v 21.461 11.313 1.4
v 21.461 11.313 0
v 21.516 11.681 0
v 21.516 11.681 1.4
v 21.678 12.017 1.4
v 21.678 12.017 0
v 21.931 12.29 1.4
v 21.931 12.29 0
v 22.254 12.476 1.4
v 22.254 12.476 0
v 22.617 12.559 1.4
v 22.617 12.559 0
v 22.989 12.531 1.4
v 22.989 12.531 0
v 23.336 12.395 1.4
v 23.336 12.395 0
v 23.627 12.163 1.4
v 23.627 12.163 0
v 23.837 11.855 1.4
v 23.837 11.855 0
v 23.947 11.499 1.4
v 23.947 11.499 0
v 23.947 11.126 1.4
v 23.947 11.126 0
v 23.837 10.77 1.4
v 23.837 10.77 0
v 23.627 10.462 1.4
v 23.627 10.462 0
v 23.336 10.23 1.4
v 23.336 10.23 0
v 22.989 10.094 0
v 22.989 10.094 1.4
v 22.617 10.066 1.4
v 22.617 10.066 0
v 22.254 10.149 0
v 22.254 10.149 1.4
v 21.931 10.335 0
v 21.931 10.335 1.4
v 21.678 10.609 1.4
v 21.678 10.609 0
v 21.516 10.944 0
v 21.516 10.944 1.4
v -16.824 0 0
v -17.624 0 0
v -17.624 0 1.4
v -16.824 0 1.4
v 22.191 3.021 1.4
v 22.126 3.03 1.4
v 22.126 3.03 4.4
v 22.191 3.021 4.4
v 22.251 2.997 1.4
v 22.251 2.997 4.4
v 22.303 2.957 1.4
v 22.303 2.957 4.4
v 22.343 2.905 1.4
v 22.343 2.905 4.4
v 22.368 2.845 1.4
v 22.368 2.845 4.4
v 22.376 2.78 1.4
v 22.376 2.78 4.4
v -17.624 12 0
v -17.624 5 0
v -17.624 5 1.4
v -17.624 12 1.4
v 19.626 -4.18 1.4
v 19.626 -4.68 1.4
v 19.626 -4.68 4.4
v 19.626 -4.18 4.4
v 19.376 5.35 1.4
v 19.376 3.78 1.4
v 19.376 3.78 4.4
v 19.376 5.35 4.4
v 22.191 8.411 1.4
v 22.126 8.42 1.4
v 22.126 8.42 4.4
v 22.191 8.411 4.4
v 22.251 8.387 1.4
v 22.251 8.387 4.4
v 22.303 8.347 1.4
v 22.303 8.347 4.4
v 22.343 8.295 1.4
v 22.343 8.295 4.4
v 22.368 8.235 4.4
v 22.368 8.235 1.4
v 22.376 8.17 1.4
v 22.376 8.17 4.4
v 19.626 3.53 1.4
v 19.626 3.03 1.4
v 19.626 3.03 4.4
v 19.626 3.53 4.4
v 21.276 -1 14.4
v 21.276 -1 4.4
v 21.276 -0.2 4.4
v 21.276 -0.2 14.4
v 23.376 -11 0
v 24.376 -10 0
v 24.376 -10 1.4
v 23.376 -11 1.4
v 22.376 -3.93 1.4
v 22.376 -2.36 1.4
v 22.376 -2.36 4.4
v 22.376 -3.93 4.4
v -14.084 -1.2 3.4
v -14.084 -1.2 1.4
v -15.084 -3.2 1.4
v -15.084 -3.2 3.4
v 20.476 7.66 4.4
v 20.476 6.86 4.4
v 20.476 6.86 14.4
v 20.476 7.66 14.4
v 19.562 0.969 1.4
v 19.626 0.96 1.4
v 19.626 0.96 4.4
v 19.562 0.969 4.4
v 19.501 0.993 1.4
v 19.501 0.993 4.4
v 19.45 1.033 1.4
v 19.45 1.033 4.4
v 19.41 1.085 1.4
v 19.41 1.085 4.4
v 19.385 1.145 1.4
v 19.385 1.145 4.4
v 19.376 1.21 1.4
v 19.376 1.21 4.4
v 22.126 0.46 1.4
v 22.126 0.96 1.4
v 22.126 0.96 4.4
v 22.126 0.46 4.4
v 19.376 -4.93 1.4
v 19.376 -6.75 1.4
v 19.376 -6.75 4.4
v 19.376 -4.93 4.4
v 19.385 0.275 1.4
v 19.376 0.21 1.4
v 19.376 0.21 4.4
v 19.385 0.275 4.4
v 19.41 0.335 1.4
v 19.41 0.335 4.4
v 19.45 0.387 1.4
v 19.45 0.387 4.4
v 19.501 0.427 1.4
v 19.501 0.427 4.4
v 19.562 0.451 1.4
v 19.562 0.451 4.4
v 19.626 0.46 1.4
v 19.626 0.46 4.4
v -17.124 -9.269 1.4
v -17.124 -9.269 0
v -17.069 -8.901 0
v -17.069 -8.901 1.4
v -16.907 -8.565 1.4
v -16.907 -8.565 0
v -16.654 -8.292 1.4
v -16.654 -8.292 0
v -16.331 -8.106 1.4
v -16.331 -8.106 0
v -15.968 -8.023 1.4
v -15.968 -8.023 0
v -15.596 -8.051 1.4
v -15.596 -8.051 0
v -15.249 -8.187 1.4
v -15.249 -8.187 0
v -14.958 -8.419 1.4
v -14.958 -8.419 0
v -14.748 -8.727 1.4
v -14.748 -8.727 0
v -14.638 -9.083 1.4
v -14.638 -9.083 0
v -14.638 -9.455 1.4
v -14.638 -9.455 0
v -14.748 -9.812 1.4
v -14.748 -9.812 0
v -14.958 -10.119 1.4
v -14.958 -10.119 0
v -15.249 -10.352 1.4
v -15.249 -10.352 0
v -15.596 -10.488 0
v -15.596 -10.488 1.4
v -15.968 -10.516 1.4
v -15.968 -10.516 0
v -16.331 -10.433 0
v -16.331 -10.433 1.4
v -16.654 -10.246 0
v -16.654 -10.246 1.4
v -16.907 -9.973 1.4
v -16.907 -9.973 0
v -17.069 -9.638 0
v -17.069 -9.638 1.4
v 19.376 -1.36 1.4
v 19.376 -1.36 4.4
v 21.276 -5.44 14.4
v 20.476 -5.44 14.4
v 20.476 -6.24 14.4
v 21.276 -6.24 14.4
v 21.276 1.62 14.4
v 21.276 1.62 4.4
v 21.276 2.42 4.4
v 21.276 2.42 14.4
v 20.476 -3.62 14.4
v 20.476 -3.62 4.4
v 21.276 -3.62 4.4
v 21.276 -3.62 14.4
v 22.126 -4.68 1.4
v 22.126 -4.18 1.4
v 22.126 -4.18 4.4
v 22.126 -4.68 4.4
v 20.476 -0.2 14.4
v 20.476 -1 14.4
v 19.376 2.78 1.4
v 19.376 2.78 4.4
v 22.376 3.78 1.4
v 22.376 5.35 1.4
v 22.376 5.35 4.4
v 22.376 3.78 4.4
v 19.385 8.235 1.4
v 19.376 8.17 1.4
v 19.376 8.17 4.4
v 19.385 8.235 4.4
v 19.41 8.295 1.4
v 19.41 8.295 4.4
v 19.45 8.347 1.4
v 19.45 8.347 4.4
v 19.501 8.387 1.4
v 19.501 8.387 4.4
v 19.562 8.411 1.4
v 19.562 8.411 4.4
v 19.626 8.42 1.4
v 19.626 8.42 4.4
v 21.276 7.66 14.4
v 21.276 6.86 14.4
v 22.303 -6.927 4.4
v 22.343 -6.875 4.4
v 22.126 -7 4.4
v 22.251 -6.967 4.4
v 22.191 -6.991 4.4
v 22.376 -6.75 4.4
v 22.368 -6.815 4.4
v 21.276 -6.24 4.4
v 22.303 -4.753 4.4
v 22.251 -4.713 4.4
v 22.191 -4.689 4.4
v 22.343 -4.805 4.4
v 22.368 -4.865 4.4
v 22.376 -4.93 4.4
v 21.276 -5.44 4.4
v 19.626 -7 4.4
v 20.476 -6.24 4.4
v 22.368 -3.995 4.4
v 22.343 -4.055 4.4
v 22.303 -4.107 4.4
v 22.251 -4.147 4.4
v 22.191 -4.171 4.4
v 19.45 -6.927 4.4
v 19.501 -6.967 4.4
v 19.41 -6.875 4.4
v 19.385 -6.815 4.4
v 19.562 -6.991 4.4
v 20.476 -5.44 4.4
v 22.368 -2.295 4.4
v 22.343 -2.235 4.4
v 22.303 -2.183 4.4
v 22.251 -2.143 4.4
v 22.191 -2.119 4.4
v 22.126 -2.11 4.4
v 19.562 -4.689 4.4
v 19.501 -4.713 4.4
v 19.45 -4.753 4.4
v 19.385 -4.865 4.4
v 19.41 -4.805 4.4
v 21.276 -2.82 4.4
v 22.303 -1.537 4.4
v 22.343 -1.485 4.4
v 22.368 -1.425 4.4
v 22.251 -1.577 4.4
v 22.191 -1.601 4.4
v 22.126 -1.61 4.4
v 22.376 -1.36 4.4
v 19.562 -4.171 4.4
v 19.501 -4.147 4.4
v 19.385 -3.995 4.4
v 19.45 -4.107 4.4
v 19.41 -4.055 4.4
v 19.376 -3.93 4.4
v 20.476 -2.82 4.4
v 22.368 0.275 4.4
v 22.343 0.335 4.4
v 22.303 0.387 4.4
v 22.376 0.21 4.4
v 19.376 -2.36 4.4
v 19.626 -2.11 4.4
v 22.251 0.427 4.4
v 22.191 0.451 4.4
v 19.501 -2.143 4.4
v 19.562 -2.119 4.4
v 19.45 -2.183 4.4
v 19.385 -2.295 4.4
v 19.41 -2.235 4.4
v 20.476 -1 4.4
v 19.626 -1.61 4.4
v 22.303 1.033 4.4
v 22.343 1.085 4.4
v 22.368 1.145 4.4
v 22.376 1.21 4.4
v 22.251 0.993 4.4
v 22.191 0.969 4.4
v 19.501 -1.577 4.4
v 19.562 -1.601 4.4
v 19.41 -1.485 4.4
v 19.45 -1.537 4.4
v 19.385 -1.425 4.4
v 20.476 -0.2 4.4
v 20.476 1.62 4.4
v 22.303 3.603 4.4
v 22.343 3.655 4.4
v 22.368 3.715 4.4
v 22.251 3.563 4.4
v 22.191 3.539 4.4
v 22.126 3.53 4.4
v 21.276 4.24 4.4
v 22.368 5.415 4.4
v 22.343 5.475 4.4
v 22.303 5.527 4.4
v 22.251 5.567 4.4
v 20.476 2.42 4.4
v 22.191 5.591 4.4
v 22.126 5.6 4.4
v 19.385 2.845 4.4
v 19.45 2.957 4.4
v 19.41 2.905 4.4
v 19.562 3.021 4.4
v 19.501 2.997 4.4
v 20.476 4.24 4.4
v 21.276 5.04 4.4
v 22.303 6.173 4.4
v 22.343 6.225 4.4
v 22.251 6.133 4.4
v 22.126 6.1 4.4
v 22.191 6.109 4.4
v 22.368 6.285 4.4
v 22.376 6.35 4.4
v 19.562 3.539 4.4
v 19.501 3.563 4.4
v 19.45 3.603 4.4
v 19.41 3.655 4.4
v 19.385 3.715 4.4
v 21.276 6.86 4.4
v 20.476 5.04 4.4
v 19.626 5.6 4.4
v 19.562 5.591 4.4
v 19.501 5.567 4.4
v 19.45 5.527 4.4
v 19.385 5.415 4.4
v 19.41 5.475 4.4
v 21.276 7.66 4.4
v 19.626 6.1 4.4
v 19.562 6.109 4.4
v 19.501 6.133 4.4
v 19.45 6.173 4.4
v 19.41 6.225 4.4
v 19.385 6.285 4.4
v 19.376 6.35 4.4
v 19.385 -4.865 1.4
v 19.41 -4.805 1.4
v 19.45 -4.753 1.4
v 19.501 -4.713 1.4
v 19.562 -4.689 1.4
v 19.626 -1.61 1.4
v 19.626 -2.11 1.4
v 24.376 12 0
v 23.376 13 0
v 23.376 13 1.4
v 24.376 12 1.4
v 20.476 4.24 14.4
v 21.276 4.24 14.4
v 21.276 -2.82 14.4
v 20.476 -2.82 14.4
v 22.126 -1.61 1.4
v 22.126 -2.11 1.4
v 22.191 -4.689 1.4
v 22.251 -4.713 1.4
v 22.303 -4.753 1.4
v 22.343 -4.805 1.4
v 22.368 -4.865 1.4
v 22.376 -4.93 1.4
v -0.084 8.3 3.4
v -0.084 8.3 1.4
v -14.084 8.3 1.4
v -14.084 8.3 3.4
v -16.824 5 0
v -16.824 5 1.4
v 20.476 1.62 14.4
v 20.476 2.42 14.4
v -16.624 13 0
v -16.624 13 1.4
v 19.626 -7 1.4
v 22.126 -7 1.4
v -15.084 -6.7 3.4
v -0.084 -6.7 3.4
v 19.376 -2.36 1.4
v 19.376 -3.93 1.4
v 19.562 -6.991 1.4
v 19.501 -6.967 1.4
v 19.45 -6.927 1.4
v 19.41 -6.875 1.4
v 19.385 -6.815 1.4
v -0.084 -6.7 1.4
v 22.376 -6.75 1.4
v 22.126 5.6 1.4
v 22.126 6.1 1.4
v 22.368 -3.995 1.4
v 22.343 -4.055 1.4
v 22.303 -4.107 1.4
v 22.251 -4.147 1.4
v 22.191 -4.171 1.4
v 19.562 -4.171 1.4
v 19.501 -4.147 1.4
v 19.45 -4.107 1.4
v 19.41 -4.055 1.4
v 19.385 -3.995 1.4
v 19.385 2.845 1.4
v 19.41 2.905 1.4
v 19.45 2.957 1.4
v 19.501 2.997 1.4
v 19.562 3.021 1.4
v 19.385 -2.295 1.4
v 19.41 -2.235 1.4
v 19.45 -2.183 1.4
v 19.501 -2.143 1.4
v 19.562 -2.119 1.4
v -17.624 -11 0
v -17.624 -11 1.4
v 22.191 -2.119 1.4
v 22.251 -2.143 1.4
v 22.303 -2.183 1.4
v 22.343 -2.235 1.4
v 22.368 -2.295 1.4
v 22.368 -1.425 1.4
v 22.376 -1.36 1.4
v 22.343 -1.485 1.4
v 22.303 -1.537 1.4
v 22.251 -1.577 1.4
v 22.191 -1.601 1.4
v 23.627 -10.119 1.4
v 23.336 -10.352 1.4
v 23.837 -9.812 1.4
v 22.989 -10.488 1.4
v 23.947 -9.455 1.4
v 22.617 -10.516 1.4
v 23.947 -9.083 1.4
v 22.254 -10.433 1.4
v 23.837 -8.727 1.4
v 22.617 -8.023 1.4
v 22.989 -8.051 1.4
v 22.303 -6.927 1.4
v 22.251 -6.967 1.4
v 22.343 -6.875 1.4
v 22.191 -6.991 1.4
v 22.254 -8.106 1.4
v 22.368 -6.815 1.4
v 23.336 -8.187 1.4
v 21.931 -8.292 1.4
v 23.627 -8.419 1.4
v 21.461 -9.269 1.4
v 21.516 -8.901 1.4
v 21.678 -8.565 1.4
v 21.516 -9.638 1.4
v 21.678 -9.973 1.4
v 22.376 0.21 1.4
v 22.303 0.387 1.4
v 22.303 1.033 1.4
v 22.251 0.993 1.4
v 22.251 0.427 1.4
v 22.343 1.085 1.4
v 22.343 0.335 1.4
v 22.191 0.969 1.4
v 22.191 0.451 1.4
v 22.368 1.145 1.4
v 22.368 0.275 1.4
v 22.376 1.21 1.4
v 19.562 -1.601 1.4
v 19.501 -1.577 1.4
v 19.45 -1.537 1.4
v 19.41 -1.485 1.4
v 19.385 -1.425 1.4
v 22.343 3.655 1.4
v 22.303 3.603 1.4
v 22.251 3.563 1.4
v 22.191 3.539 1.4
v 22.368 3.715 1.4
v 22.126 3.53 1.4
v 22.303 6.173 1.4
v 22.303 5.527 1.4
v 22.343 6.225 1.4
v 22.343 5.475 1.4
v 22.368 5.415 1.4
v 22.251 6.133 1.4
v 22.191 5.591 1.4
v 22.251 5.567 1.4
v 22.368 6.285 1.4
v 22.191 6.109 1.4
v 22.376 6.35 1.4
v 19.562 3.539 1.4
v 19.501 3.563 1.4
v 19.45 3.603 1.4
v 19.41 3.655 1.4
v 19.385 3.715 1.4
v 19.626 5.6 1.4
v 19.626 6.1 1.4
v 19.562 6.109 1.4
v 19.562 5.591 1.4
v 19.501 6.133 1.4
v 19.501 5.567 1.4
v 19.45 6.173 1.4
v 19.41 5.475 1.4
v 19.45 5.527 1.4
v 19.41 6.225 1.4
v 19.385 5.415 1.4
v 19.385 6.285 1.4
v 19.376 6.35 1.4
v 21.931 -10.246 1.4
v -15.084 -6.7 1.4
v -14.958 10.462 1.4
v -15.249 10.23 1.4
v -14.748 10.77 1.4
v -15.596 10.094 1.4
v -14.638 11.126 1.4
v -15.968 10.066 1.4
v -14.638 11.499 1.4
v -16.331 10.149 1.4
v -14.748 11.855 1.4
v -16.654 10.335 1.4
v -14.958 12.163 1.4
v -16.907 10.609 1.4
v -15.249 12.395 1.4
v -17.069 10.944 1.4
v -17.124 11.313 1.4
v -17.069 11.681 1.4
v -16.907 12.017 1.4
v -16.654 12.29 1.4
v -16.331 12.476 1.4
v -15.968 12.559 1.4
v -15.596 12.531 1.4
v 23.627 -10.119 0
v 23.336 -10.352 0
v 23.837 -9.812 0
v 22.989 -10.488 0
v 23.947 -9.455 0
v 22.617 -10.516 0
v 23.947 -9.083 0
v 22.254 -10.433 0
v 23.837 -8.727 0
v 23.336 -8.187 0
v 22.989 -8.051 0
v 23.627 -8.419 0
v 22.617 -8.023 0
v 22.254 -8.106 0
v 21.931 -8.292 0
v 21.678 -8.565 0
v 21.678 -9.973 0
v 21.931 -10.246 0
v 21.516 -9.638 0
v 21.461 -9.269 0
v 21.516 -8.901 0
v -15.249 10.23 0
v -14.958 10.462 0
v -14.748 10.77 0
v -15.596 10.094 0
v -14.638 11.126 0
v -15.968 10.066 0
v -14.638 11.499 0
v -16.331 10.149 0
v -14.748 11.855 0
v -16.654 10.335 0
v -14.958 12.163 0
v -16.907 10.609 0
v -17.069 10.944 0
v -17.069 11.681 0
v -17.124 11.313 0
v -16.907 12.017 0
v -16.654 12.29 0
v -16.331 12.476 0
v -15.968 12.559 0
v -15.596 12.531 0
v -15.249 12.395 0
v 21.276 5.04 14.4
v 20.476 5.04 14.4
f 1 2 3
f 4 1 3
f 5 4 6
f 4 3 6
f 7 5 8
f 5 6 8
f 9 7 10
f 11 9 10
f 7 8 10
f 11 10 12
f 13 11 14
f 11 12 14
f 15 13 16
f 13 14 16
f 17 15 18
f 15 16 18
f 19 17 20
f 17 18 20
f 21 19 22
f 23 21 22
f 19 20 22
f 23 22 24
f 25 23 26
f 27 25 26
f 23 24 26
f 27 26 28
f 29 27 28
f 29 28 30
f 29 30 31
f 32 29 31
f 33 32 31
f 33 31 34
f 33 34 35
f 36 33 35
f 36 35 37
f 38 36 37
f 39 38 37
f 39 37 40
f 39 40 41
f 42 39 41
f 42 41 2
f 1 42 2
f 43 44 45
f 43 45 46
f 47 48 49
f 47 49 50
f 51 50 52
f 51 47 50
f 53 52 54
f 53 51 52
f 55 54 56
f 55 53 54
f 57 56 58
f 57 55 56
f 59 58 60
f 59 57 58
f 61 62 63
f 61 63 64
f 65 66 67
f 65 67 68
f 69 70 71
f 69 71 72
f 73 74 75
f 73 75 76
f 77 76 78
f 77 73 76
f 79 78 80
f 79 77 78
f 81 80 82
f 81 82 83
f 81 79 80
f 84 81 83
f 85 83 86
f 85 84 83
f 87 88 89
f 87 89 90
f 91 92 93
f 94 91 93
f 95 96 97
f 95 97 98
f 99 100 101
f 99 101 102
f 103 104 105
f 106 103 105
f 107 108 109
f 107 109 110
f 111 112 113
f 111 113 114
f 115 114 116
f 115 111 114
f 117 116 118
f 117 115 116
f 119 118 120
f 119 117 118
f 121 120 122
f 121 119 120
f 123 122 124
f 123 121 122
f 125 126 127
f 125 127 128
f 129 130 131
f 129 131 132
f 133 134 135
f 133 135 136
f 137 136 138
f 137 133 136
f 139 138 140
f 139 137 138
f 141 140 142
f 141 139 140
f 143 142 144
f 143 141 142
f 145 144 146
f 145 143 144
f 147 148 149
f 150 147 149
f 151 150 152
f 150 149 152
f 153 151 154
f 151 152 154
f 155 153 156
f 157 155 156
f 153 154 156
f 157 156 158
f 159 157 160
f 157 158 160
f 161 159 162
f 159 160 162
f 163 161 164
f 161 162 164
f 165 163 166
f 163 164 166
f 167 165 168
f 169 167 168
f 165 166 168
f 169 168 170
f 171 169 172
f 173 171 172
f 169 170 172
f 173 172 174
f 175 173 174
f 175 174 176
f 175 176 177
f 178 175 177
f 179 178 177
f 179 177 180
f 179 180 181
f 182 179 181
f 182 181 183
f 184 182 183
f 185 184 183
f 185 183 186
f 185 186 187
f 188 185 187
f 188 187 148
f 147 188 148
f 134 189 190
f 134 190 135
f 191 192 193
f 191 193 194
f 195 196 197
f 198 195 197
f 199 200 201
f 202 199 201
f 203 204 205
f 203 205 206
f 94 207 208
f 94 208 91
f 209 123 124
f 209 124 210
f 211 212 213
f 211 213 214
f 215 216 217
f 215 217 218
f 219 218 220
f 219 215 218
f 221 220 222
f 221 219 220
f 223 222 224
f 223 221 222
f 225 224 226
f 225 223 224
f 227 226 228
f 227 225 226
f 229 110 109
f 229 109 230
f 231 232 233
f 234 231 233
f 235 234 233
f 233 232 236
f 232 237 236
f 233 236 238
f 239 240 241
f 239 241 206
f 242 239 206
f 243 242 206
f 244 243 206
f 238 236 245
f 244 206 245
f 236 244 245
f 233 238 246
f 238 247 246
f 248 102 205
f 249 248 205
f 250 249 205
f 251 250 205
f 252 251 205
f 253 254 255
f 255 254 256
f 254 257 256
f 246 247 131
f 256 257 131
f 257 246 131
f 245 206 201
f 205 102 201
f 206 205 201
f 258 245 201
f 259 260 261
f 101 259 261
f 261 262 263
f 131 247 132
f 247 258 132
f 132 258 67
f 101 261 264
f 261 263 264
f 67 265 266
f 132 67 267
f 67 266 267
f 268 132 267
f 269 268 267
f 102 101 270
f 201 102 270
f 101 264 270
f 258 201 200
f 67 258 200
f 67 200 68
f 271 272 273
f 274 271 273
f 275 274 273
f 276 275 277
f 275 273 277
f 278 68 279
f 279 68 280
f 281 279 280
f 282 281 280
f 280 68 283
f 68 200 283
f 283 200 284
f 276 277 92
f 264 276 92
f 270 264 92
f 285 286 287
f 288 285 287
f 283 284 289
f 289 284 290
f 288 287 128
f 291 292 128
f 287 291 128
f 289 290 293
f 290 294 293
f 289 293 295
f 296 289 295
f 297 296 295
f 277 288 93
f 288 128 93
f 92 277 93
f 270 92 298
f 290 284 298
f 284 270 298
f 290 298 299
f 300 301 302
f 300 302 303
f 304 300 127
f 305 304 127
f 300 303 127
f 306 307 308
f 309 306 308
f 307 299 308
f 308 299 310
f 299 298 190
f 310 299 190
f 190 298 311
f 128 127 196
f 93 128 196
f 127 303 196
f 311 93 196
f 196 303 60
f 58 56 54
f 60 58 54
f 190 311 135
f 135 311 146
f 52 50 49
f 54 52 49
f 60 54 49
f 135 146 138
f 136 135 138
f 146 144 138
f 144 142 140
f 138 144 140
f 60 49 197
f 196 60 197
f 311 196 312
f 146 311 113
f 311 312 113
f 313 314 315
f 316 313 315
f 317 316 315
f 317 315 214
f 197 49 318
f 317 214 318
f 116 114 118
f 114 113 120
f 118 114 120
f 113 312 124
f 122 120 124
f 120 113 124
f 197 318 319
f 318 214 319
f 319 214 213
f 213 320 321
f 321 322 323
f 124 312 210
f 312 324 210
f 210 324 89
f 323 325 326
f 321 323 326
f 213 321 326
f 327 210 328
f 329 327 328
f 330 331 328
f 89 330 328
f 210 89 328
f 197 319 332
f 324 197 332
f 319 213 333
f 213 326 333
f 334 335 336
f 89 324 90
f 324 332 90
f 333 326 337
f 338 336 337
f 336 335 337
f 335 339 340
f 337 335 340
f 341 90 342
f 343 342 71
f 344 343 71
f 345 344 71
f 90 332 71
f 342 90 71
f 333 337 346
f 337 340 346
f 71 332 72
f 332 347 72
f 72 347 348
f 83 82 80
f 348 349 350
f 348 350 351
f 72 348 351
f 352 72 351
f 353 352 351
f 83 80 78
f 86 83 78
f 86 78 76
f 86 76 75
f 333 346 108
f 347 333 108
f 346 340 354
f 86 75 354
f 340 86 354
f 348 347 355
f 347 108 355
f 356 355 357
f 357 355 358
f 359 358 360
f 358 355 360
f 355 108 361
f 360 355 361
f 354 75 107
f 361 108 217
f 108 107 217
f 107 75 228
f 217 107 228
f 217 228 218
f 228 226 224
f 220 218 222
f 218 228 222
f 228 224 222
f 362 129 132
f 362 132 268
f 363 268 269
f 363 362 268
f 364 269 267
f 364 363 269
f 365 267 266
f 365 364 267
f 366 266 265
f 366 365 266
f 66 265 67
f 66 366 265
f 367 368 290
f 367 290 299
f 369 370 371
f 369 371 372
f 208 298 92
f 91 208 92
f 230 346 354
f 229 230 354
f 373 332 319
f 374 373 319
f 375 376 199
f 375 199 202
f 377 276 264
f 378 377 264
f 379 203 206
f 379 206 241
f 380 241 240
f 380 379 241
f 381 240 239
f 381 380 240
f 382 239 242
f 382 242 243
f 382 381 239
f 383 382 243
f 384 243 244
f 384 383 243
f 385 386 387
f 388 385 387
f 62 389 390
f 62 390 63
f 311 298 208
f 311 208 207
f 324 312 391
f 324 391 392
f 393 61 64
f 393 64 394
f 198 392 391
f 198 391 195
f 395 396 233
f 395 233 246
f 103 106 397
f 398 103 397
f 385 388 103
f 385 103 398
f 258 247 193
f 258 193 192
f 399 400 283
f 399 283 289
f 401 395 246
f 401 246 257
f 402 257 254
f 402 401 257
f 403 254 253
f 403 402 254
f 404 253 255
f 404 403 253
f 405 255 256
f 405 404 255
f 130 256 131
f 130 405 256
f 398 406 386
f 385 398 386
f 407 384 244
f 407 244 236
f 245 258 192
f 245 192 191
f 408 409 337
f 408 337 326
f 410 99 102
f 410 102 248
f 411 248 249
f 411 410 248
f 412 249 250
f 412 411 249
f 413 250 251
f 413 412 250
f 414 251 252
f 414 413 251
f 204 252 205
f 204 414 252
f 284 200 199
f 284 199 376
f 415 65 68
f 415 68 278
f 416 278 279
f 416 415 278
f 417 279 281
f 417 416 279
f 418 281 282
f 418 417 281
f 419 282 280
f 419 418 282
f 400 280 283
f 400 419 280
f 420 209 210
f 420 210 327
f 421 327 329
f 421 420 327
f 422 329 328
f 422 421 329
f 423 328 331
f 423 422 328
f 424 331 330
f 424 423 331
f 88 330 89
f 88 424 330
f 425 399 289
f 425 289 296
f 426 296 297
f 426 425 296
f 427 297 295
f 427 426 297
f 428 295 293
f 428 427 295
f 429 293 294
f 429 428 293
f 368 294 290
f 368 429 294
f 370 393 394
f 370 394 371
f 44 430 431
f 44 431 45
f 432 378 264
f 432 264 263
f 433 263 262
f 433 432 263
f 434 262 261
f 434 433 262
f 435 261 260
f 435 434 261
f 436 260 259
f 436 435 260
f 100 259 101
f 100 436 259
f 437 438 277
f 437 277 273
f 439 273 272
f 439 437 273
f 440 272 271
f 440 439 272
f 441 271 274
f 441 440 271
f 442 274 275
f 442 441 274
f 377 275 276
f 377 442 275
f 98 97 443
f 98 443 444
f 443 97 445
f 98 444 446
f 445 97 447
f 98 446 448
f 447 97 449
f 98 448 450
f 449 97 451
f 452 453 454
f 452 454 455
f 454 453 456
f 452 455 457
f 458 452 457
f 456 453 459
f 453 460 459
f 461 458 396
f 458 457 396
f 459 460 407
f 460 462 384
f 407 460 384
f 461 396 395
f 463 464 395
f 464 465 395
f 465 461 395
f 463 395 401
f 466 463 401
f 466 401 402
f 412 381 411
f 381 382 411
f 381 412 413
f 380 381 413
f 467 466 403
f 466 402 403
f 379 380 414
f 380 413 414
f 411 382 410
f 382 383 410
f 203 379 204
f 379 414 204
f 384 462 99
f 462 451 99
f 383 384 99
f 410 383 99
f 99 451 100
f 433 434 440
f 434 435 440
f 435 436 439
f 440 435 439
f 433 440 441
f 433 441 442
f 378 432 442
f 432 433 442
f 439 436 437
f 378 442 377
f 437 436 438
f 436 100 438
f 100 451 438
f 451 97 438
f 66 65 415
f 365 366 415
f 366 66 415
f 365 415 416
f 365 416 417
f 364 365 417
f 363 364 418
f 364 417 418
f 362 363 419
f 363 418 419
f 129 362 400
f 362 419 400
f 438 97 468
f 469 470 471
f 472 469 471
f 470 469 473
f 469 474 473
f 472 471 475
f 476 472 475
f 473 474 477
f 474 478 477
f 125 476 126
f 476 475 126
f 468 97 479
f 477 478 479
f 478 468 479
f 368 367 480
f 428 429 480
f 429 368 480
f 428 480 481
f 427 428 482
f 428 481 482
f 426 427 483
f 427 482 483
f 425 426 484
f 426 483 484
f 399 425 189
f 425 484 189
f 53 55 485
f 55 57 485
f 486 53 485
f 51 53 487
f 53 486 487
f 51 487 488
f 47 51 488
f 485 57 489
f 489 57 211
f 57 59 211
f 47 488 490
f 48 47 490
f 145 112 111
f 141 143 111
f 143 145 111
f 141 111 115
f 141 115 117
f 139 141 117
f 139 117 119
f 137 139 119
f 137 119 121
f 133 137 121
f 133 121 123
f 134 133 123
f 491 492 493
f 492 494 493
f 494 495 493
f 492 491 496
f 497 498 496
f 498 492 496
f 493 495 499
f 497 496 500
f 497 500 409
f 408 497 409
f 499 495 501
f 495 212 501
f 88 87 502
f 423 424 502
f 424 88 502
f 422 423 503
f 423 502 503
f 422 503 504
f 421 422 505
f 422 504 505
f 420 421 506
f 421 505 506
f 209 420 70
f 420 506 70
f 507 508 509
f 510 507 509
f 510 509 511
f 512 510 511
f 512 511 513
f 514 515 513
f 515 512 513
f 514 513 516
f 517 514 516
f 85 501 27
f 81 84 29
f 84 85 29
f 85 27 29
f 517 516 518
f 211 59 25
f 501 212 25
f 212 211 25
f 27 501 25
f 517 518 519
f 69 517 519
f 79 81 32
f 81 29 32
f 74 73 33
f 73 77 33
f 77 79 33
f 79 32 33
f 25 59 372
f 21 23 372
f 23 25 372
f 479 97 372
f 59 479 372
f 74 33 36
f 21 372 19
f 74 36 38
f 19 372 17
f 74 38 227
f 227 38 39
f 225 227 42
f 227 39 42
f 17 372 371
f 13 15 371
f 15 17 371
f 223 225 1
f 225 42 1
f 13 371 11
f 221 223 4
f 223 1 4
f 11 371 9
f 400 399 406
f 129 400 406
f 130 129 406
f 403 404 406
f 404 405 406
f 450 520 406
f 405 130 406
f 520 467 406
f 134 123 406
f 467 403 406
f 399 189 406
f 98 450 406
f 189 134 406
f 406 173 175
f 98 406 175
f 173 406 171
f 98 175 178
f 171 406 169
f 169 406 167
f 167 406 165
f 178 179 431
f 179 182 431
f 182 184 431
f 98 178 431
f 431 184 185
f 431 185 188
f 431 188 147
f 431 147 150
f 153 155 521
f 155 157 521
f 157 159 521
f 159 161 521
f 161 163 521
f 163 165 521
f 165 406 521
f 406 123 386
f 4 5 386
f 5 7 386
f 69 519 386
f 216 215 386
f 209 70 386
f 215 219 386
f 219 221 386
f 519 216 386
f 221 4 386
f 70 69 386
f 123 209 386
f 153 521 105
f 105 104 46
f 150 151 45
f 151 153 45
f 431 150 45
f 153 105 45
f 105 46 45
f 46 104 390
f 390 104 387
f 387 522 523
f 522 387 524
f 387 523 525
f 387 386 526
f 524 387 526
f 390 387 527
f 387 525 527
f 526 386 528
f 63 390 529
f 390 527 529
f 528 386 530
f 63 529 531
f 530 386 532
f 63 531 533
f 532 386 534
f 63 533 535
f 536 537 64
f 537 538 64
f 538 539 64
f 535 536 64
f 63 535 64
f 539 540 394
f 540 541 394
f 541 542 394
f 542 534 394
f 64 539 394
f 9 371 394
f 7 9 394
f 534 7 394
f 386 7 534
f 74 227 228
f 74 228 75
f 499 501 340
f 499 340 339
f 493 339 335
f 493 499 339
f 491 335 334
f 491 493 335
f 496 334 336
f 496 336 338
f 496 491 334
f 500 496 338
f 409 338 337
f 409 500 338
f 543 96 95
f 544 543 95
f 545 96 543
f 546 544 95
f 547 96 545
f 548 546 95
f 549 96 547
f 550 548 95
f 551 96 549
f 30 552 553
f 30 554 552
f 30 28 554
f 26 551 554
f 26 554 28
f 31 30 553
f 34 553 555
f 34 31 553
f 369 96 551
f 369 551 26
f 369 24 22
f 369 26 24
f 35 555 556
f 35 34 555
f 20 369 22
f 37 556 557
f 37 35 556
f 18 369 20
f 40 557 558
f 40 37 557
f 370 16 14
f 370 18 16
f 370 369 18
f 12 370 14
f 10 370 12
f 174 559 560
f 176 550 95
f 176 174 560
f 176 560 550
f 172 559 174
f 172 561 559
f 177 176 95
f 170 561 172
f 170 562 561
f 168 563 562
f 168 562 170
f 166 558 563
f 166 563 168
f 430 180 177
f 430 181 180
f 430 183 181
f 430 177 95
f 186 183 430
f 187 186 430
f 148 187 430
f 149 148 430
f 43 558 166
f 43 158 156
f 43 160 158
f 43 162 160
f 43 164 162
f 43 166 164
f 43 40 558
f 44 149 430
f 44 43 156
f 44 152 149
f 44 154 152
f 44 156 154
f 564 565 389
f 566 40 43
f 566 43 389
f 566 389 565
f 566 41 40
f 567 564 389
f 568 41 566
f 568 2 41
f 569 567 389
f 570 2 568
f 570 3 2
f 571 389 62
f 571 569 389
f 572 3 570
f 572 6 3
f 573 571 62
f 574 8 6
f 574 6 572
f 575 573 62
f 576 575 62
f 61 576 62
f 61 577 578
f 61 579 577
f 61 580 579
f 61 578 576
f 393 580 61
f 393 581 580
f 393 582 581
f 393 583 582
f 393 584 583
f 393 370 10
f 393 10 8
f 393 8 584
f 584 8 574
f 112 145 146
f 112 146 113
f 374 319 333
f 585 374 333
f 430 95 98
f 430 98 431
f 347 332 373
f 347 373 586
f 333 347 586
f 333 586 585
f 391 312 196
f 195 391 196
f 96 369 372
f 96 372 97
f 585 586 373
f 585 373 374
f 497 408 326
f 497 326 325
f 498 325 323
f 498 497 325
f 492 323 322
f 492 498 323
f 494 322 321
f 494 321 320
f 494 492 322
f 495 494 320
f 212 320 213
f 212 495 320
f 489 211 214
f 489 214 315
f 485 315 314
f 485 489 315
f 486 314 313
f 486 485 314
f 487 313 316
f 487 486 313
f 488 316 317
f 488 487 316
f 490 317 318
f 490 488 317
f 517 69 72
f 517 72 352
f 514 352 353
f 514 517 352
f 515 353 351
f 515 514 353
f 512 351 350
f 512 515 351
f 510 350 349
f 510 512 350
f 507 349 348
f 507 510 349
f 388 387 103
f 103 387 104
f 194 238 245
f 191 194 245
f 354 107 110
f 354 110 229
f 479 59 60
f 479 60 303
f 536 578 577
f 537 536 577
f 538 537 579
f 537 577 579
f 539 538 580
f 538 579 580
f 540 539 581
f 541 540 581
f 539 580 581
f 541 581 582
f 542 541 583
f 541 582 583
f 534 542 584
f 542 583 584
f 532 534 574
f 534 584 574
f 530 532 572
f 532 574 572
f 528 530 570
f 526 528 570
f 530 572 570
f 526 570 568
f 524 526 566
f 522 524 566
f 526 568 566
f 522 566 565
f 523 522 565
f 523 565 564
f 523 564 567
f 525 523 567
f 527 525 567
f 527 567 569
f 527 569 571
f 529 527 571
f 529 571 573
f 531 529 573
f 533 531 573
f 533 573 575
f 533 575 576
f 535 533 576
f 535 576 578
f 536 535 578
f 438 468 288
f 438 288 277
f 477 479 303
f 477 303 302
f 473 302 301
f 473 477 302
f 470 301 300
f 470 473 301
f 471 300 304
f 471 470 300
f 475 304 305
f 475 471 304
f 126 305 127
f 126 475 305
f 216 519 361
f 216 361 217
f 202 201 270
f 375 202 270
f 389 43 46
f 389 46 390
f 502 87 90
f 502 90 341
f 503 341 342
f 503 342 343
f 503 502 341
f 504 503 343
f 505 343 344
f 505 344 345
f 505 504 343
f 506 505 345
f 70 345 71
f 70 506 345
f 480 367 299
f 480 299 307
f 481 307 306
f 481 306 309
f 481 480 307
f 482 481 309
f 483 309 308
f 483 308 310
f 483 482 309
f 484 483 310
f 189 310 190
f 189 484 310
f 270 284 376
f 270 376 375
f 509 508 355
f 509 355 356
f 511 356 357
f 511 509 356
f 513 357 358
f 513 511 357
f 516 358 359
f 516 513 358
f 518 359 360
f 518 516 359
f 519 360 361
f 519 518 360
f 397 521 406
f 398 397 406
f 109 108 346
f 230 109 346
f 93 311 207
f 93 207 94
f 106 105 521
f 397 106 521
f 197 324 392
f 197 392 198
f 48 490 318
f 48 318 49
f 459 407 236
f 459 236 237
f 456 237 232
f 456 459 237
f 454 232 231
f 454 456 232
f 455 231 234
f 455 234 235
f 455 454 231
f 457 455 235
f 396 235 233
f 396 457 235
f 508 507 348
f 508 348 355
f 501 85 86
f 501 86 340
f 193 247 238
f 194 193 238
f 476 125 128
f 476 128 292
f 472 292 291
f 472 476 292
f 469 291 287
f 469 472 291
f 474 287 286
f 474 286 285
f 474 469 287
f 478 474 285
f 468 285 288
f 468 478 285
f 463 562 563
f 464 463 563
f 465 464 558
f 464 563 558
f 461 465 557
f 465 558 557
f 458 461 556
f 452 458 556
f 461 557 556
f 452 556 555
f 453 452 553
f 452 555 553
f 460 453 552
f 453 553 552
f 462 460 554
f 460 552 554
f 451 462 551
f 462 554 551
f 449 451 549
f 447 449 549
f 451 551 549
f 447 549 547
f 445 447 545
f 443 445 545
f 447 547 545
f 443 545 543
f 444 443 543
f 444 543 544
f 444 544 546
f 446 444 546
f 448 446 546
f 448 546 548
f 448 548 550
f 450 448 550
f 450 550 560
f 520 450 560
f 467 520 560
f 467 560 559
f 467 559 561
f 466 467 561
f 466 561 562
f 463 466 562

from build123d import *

# Parameters (mm, degrees)
BOSS_EXTRUDE1_DEPTH        = 1.4
F_2_5_2_5_DIAMETER_SLOT1_D = 2.5
BOSS_EXTRUDE2_DEPTH        = 2
BOSS_EXTRUDE3_DEPTH        = 3
SKETCH8_W                  = 0.8
SKETCH8_H                  = 0.8
BOSS_EXTRUDE4_DEPTH        = 10


with BuildPart() as part:
    # Sketch1 → Boss-Extrude1 (new body)
    with BuildSketch(Plane.XY):
        Polygon((-17.623529412, 12), (-16.623529412, 13), (23.376470588, 13), (24.376470588, 12), (24.376470588, -10), (23.376470588, -11), (-17.623529412, -11), (-17.623529412, 0), (-16.823529412, 0), (-16.823529412, 5), (-17.623529412, 5), align=None)
    extrude(amount=BOSS_EXTRUDE1_DEPTH)

    # Ø2.5 (2.5) Diameter Slot1 (through all)
    with Locations(Plane.XY.offset(1.4)):
        with Locations((-15.874285672, -9.269193445), (-15.874285672, 11.312714255), (22.710754066, -9.269193445), (22.710754066, 11.312714255)):
            Hole(F_2_5_2_5_DIAMETER_SLOT1_D / 2)

    # Sketch6 → Boss-Extrude2 (add)
    with BuildSketch(Plane.XY.offset(1.4)):
        Polygon((-15.083529412, -6.7), (-0.083529412, -6.7), (-0.083529412, 8.3), (-14.083529412, 8.3), (-14.083529412, -1.2), (-15.083529412, -3.2), align=None)
    extrude(amount=BOSS_EXTRUDE2_DEPTH)

    # Sketch7 → Boss-Extrude3 (add)
    with BuildSketch(Plane.XY.offset(1.4)):
        with BuildLine():
            Line((22.126470588, 6.1), (22.126470588, 5.6))
            ThreePointArc((22.126470588, 5.6), (22.303247284, 5.526776695), (22.376470588, 5.35))
            Line((22.376470588, 5.35), (22.376470588, 3.78))
            ThreePointArc((22.376470588, 3.78), (22.303247284, 3.603223305), (22.126470588, 3.53))
            Line((22.126470588, 3.53), (22.126470588, 3.03))
            ThreePointArc((22.126470588, 3.03), (22.303247284, 2.956776695), (22.376470588, 2.78))
            Line((22.376470588, 2.78), (22.376470588, 1.21))
            ThreePointArc((22.376470588, 1.21), (22.303247284, 1.033223305), (22.126470588, 0.96))
            Line((22.126470588, 0.96), (22.126470588, 0.46))
            ThreePointArc((22.126470588, 0.46), (22.303247284, 0.386776695), (22.376470588, 0.21))
            Line((22.376470588, 0.21), (22.376470588, -1.36))
            ThreePointArc((22.376470588, -1.36), (22.303247284, -1.536776695), (22.126470588, -1.61))
            Line((22.126470588, -1.61), (22.126470588, -2.11))
            ThreePointArc((22.126470588, -2.11), (22.303247284, -2.183223305), (22.376470588, -2.36))
            Line((22.376470588, -2.36), (22.376470588, -3.93))
            ThreePointArc((22.376470588, -3.93), (22.303247284, -4.106776695), (22.126470588, -4.18))
            Line((22.126470588, -4.18), (22.126470588, -4.68))
            ThreePointArc((22.126470588, -4.68), (22.303247284, -4.753223305), (22.376470588, -4.93))
            Line((22.376470588, -4.93), (22.376470588, -6.75))
            ThreePointArc((22.376470588, -6.75), (22.303247284, -6.926776695), (22.126470588, -7))
            Line((22.126470588, -7), (19.626470588, -7))
            ThreePointArc((19.626470588, -7), (19.449693893, -6.926776695), (19.376470588, -6.75))
            Line((19.376470588, -6.75), (19.376470588, -4.93))
            ThreePointArc((19.376470588, -4.93), (19.449693893, -4.753223305), (19.626470588, -4.68))
            Line((19.626470588, -4.68), (19.626470588, -4.18))
            ThreePointArc((19.626470588, -4.18), (19.449693893, -4.106776695), (19.376470588, -3.93))
            Line((19.376470588, -3.93), (19.376470588, -2.36))
            ThreePointArc((19.376470588, -2.36), (19.449693893, -2.183223305), (19.626470588, -2.11))
            Line((19.626470588, -2.11), (19.626470588, -1.61))
            ThreePointArc((19.626470588, -1.61), (19.449693893, -1.536776695), (19.376470588, -1.36))
            Line((19.376470588, -1.36), (19.376470588, 0.21))
            ThreePointArc((19.376470588, 0.21), (19.449693893, 0.386776695), (19.626470588, 0.46))
            Line((19.626470588, 0.46), (19.626470588, 0.96))
            ThreePointArc((19.626470588, 0.96), (19.449693893, 1.033223305), (19.376470588, 1.21))
            Line((19.376470588, 1.21), (19.376470588, 2.78))
            ThreePointArc((19.376470588, 2.78), (19.449693893, 2.956776695), (19.626470588, 3.03))
            Line((19.626470588, 3.03), (19.626470588, 3.53))
            ThreePointArc((19.626470588, 3.53), (19.449693893, 3.603223305), (19.376470588, 3.78))
            Line((19.376470588, 3.78), (19.376470588, 5.35))
            ThreePointArc((19.376470588, 5.35), (19.449693893, 5.526776695), (19.626470588, 5.6))
            Line((19.626470588, 5.6), (19.626470588, 6.1))
            ThreePointArc((19.626470588, 6.1), (19.449693893, 6.173223305), (19.376470588, 6.35))
            Line((19.376470588, 6.35), (19.376470588, 8.17))
            ThreePointArc((19.376470588, 8.17), (19.449693893, 8.346776695), (19.626470588, 8.42))
            Line((19.626470588, 8.42), (22.126470588, 8.42))
            ThreePointArc((22.126470588, 8.42), (22.303247284, 8.346776695), (22.376470588, 8.17))
            Line((22.376470588, 8.17), (22.376470588, 6.35))
            ThreePointArc((22.376470588, 6.35), (22.303247284, 6.173223305), (22.126470588, 6.1))
        make_face()
    extrude(amount=BOSS_EXTRUDE3_DEPTH)

    # Sketch8 → Boss-Extrude4 (add)
    with BuildSketch(Plane.XY.offset(4.4)):
        with Locations((20.876470588, -5.84)):
            Rectangle(SKETCH8_W, SKETCH8_H)
        with Locations((20.876470588, -3.22)):
            Rectangle(SKETCH8_W, SKETCH8_H)
        with Locations((20.876470588, -0.6)):
            Rectangle(SKETCH8_W, SKETCH8_H)
        with Locations((20.876470588, 2.02)):
            Rectangle(SKETCH8_W, SKETCH8_H)
        with Locations((20.876470588, 4.64)):
            Rectangle(SKETCH8_W, SKETCH8_H)
        with Locations((20.876470588, 7.26)):
            Rectangle(SKETCH8_W, SKETCH8_H)
    extrude(amount=BOSS_EXTRUDE4_DEPTH)


solid = part.part
